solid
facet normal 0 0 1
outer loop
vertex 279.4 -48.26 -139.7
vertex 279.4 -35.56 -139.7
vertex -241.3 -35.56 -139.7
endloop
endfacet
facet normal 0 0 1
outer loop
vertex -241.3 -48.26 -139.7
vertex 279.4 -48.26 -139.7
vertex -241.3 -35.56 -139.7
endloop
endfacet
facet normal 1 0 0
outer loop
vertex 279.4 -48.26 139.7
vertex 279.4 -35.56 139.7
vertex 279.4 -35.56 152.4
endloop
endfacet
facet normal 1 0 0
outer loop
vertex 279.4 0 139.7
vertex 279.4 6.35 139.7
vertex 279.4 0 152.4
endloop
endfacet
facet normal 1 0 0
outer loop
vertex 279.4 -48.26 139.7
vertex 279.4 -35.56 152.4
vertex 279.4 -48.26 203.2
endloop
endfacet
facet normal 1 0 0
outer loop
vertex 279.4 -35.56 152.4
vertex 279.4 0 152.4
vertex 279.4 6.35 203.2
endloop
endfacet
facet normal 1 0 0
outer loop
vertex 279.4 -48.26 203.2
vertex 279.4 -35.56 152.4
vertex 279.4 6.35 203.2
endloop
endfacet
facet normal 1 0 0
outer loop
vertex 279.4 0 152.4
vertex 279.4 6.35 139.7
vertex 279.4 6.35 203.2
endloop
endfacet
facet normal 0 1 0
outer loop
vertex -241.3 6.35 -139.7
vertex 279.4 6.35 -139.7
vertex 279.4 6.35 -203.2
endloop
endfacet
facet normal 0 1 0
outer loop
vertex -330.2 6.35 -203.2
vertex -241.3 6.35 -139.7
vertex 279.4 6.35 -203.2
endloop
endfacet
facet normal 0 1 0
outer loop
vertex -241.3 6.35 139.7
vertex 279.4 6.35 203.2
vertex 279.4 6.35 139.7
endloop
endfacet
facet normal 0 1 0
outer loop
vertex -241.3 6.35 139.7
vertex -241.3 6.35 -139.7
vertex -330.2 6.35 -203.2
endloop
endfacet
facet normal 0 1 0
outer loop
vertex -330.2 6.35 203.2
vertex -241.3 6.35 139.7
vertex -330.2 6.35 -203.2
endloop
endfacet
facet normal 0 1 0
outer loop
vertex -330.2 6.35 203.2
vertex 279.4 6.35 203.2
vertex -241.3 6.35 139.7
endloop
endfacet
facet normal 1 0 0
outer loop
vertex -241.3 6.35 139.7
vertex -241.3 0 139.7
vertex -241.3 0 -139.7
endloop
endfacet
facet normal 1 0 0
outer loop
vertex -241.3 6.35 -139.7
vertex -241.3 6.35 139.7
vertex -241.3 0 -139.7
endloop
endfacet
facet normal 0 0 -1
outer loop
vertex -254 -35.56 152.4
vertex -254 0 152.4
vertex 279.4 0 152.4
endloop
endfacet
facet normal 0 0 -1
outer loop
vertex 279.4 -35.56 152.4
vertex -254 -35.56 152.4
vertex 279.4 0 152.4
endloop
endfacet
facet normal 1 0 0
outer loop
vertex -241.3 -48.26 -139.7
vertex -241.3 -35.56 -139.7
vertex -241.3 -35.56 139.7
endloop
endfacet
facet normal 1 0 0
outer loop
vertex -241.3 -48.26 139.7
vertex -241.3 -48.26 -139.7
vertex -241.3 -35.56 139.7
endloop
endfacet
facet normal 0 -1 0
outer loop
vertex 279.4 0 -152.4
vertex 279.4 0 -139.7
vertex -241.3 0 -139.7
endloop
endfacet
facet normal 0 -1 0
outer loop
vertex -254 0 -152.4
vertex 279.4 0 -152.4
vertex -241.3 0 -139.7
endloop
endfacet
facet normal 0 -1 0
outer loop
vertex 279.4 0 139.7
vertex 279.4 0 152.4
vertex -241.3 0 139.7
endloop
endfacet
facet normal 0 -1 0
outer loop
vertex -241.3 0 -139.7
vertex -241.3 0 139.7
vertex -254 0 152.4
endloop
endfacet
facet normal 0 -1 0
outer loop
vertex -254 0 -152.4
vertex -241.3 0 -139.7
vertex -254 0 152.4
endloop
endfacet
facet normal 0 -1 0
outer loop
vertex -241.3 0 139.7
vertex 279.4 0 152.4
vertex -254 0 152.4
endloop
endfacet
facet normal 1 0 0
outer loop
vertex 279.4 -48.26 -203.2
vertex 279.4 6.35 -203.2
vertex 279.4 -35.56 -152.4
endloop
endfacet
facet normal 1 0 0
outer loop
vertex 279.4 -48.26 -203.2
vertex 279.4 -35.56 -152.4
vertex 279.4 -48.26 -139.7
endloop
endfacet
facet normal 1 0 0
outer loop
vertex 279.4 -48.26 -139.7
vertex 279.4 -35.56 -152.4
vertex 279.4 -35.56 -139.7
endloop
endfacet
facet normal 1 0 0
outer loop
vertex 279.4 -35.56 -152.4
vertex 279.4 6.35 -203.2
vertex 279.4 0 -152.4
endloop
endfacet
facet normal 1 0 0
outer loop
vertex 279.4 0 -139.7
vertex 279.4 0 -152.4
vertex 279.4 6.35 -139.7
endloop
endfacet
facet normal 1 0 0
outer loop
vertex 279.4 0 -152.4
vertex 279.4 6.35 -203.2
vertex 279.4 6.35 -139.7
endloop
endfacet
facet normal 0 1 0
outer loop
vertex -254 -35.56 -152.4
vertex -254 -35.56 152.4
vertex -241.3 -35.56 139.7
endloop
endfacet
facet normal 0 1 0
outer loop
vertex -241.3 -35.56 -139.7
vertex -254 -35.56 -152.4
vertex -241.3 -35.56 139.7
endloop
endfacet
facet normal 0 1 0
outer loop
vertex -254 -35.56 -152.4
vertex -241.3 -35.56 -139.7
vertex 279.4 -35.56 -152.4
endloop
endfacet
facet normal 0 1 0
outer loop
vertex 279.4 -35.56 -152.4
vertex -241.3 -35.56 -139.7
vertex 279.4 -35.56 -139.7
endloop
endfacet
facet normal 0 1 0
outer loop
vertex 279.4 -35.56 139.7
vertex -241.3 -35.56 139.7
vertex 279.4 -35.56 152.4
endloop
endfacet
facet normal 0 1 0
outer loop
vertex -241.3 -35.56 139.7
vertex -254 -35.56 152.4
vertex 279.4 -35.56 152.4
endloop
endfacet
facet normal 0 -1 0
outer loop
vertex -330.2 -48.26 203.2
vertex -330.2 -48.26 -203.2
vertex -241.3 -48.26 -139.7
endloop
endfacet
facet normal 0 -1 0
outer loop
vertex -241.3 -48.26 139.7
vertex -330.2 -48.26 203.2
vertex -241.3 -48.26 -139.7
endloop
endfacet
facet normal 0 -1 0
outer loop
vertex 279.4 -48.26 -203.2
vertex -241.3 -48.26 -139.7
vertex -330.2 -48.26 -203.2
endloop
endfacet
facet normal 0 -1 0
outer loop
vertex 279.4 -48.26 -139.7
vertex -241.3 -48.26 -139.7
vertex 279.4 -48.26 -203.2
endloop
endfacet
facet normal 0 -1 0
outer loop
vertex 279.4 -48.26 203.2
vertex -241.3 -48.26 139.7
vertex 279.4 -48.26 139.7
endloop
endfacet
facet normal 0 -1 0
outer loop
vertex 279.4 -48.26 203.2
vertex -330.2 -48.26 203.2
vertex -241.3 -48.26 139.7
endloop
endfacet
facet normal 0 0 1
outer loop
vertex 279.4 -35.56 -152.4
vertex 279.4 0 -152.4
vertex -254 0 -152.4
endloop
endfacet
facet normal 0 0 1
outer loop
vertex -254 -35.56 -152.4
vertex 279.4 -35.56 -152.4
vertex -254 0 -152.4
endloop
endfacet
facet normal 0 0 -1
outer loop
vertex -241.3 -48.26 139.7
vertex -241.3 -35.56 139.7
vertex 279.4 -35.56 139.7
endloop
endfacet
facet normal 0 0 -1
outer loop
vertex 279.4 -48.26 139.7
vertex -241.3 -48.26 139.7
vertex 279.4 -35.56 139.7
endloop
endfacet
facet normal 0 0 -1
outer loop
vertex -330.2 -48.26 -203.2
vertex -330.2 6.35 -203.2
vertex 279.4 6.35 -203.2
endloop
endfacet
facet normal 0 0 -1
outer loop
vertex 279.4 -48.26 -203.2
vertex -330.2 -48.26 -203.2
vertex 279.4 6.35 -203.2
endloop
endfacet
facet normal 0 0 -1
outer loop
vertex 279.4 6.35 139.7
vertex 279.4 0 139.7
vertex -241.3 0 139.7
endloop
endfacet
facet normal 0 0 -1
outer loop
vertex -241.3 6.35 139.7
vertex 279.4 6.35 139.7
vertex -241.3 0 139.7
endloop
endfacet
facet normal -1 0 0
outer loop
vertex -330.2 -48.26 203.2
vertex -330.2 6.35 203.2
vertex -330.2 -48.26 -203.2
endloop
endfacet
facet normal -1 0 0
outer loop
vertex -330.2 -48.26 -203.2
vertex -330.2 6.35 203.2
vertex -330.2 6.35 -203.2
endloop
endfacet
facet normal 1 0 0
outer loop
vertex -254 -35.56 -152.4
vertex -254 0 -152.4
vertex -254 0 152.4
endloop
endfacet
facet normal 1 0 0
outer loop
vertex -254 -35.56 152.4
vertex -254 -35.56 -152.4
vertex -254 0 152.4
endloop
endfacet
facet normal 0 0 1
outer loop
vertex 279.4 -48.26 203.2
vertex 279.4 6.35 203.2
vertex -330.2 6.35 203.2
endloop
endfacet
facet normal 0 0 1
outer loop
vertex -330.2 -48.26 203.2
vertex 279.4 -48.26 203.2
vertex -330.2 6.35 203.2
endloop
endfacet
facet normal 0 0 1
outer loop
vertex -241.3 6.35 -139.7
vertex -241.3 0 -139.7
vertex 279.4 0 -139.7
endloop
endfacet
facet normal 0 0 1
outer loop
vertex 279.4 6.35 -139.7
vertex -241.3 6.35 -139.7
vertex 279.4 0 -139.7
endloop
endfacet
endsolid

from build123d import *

# Parameters (mm, degrees)
F1_DEPTH = 35.56
F3_DEPTH = 6.35
F5_DEPTH = 12.7
F6_W     = 50.8
F6_H     = 406.4
F7_DEPTH = 162.56


with BuildPart() as f1:
    # F0 (on Front) → F1 (new body)
    with BuildSketch(Plane.XZ):
        Polygon((-254, 152.4), (254, 152.4), (330.2, 152.4), (330.2, 203.2), (-330.2, 203.2), (-330.2, -203.2), (330.2, -203.2), (330.2, -152.4), (254, -152.4), (-254, -152.4), align=None)
    extrude(amount=F1_DEPTH)

    # F2 (on face) + F1_face (on face) → F3 (join)
    with BuildSketch(Plane(origin=(0, 0, 0), x_dir=(-1, 0, 0), z_dir=(0, 1, 0))):
        Polygon((254, 152.4), (-330.2, 152.4), (-330.2, 139.7), (241.3, 139.7), (241.3, -139.7), (-330.2, -139.7), (-330.2, -152.4), (254, -152.4), align=None)
        Polygon((330.2, 203.2), (-330.2, 203.2), (-330.2, 152.4), (254, 152.4), (254, -152.4), (-330.2, -152.4), (-330.2, -203.2), (330.2, -203.2), align=None)
    with BuildSketch(Plane(origin=(-75.111429, 0, 0), x_dir=(1, 0, 0), z_dir=(0, 1, 0))):
        Polygon((-178.888571, -152.4), (405.311429, -152.4), (405.311429, -203.2), (-255.088571, -203.2), (-255.088571, 203.2), (405.311429, 203.2), (405.311429, 152.4), (-178.888571, 152.4), align=None)
    extrude(amount=F3_DEPTH)

    # F4 (on face) → F5 (join)
    with BuildSketch(Plane.XZ.offset(35.56)):
        Polygon((330.2, 203.2), (-330.2, 203.2), (-330.2, -203.2), (330.2, -203.2), (330.2, -152.4), (-254, -152.4), (-254, 152.4), (330.2, 152.4), align=None)
        Polygon((330.2, 139.7), (330.2, 152.4), (-254, 152.4), (-254, -152.4), (330.2, -152.4), (330.2, -139.7), (-241.3, -139.7), (-241.3, 139.7), align=None)
    extrude(amount=F5_DEPTH)

    # F6 (on face) → F7 (cut)
    with BuildSketch(Plane(origin=(0, 6.35, 0), x_dir=(-1, 0, 0), z_dir=(0, 1, 0))):
        with Locations((-304.8, 0)):
            Rectangle(F6_W, F6_H)
    extrude(amount=-F7_DEPTH, mode=Mode.SUBTRACT)


solid = f1.part
